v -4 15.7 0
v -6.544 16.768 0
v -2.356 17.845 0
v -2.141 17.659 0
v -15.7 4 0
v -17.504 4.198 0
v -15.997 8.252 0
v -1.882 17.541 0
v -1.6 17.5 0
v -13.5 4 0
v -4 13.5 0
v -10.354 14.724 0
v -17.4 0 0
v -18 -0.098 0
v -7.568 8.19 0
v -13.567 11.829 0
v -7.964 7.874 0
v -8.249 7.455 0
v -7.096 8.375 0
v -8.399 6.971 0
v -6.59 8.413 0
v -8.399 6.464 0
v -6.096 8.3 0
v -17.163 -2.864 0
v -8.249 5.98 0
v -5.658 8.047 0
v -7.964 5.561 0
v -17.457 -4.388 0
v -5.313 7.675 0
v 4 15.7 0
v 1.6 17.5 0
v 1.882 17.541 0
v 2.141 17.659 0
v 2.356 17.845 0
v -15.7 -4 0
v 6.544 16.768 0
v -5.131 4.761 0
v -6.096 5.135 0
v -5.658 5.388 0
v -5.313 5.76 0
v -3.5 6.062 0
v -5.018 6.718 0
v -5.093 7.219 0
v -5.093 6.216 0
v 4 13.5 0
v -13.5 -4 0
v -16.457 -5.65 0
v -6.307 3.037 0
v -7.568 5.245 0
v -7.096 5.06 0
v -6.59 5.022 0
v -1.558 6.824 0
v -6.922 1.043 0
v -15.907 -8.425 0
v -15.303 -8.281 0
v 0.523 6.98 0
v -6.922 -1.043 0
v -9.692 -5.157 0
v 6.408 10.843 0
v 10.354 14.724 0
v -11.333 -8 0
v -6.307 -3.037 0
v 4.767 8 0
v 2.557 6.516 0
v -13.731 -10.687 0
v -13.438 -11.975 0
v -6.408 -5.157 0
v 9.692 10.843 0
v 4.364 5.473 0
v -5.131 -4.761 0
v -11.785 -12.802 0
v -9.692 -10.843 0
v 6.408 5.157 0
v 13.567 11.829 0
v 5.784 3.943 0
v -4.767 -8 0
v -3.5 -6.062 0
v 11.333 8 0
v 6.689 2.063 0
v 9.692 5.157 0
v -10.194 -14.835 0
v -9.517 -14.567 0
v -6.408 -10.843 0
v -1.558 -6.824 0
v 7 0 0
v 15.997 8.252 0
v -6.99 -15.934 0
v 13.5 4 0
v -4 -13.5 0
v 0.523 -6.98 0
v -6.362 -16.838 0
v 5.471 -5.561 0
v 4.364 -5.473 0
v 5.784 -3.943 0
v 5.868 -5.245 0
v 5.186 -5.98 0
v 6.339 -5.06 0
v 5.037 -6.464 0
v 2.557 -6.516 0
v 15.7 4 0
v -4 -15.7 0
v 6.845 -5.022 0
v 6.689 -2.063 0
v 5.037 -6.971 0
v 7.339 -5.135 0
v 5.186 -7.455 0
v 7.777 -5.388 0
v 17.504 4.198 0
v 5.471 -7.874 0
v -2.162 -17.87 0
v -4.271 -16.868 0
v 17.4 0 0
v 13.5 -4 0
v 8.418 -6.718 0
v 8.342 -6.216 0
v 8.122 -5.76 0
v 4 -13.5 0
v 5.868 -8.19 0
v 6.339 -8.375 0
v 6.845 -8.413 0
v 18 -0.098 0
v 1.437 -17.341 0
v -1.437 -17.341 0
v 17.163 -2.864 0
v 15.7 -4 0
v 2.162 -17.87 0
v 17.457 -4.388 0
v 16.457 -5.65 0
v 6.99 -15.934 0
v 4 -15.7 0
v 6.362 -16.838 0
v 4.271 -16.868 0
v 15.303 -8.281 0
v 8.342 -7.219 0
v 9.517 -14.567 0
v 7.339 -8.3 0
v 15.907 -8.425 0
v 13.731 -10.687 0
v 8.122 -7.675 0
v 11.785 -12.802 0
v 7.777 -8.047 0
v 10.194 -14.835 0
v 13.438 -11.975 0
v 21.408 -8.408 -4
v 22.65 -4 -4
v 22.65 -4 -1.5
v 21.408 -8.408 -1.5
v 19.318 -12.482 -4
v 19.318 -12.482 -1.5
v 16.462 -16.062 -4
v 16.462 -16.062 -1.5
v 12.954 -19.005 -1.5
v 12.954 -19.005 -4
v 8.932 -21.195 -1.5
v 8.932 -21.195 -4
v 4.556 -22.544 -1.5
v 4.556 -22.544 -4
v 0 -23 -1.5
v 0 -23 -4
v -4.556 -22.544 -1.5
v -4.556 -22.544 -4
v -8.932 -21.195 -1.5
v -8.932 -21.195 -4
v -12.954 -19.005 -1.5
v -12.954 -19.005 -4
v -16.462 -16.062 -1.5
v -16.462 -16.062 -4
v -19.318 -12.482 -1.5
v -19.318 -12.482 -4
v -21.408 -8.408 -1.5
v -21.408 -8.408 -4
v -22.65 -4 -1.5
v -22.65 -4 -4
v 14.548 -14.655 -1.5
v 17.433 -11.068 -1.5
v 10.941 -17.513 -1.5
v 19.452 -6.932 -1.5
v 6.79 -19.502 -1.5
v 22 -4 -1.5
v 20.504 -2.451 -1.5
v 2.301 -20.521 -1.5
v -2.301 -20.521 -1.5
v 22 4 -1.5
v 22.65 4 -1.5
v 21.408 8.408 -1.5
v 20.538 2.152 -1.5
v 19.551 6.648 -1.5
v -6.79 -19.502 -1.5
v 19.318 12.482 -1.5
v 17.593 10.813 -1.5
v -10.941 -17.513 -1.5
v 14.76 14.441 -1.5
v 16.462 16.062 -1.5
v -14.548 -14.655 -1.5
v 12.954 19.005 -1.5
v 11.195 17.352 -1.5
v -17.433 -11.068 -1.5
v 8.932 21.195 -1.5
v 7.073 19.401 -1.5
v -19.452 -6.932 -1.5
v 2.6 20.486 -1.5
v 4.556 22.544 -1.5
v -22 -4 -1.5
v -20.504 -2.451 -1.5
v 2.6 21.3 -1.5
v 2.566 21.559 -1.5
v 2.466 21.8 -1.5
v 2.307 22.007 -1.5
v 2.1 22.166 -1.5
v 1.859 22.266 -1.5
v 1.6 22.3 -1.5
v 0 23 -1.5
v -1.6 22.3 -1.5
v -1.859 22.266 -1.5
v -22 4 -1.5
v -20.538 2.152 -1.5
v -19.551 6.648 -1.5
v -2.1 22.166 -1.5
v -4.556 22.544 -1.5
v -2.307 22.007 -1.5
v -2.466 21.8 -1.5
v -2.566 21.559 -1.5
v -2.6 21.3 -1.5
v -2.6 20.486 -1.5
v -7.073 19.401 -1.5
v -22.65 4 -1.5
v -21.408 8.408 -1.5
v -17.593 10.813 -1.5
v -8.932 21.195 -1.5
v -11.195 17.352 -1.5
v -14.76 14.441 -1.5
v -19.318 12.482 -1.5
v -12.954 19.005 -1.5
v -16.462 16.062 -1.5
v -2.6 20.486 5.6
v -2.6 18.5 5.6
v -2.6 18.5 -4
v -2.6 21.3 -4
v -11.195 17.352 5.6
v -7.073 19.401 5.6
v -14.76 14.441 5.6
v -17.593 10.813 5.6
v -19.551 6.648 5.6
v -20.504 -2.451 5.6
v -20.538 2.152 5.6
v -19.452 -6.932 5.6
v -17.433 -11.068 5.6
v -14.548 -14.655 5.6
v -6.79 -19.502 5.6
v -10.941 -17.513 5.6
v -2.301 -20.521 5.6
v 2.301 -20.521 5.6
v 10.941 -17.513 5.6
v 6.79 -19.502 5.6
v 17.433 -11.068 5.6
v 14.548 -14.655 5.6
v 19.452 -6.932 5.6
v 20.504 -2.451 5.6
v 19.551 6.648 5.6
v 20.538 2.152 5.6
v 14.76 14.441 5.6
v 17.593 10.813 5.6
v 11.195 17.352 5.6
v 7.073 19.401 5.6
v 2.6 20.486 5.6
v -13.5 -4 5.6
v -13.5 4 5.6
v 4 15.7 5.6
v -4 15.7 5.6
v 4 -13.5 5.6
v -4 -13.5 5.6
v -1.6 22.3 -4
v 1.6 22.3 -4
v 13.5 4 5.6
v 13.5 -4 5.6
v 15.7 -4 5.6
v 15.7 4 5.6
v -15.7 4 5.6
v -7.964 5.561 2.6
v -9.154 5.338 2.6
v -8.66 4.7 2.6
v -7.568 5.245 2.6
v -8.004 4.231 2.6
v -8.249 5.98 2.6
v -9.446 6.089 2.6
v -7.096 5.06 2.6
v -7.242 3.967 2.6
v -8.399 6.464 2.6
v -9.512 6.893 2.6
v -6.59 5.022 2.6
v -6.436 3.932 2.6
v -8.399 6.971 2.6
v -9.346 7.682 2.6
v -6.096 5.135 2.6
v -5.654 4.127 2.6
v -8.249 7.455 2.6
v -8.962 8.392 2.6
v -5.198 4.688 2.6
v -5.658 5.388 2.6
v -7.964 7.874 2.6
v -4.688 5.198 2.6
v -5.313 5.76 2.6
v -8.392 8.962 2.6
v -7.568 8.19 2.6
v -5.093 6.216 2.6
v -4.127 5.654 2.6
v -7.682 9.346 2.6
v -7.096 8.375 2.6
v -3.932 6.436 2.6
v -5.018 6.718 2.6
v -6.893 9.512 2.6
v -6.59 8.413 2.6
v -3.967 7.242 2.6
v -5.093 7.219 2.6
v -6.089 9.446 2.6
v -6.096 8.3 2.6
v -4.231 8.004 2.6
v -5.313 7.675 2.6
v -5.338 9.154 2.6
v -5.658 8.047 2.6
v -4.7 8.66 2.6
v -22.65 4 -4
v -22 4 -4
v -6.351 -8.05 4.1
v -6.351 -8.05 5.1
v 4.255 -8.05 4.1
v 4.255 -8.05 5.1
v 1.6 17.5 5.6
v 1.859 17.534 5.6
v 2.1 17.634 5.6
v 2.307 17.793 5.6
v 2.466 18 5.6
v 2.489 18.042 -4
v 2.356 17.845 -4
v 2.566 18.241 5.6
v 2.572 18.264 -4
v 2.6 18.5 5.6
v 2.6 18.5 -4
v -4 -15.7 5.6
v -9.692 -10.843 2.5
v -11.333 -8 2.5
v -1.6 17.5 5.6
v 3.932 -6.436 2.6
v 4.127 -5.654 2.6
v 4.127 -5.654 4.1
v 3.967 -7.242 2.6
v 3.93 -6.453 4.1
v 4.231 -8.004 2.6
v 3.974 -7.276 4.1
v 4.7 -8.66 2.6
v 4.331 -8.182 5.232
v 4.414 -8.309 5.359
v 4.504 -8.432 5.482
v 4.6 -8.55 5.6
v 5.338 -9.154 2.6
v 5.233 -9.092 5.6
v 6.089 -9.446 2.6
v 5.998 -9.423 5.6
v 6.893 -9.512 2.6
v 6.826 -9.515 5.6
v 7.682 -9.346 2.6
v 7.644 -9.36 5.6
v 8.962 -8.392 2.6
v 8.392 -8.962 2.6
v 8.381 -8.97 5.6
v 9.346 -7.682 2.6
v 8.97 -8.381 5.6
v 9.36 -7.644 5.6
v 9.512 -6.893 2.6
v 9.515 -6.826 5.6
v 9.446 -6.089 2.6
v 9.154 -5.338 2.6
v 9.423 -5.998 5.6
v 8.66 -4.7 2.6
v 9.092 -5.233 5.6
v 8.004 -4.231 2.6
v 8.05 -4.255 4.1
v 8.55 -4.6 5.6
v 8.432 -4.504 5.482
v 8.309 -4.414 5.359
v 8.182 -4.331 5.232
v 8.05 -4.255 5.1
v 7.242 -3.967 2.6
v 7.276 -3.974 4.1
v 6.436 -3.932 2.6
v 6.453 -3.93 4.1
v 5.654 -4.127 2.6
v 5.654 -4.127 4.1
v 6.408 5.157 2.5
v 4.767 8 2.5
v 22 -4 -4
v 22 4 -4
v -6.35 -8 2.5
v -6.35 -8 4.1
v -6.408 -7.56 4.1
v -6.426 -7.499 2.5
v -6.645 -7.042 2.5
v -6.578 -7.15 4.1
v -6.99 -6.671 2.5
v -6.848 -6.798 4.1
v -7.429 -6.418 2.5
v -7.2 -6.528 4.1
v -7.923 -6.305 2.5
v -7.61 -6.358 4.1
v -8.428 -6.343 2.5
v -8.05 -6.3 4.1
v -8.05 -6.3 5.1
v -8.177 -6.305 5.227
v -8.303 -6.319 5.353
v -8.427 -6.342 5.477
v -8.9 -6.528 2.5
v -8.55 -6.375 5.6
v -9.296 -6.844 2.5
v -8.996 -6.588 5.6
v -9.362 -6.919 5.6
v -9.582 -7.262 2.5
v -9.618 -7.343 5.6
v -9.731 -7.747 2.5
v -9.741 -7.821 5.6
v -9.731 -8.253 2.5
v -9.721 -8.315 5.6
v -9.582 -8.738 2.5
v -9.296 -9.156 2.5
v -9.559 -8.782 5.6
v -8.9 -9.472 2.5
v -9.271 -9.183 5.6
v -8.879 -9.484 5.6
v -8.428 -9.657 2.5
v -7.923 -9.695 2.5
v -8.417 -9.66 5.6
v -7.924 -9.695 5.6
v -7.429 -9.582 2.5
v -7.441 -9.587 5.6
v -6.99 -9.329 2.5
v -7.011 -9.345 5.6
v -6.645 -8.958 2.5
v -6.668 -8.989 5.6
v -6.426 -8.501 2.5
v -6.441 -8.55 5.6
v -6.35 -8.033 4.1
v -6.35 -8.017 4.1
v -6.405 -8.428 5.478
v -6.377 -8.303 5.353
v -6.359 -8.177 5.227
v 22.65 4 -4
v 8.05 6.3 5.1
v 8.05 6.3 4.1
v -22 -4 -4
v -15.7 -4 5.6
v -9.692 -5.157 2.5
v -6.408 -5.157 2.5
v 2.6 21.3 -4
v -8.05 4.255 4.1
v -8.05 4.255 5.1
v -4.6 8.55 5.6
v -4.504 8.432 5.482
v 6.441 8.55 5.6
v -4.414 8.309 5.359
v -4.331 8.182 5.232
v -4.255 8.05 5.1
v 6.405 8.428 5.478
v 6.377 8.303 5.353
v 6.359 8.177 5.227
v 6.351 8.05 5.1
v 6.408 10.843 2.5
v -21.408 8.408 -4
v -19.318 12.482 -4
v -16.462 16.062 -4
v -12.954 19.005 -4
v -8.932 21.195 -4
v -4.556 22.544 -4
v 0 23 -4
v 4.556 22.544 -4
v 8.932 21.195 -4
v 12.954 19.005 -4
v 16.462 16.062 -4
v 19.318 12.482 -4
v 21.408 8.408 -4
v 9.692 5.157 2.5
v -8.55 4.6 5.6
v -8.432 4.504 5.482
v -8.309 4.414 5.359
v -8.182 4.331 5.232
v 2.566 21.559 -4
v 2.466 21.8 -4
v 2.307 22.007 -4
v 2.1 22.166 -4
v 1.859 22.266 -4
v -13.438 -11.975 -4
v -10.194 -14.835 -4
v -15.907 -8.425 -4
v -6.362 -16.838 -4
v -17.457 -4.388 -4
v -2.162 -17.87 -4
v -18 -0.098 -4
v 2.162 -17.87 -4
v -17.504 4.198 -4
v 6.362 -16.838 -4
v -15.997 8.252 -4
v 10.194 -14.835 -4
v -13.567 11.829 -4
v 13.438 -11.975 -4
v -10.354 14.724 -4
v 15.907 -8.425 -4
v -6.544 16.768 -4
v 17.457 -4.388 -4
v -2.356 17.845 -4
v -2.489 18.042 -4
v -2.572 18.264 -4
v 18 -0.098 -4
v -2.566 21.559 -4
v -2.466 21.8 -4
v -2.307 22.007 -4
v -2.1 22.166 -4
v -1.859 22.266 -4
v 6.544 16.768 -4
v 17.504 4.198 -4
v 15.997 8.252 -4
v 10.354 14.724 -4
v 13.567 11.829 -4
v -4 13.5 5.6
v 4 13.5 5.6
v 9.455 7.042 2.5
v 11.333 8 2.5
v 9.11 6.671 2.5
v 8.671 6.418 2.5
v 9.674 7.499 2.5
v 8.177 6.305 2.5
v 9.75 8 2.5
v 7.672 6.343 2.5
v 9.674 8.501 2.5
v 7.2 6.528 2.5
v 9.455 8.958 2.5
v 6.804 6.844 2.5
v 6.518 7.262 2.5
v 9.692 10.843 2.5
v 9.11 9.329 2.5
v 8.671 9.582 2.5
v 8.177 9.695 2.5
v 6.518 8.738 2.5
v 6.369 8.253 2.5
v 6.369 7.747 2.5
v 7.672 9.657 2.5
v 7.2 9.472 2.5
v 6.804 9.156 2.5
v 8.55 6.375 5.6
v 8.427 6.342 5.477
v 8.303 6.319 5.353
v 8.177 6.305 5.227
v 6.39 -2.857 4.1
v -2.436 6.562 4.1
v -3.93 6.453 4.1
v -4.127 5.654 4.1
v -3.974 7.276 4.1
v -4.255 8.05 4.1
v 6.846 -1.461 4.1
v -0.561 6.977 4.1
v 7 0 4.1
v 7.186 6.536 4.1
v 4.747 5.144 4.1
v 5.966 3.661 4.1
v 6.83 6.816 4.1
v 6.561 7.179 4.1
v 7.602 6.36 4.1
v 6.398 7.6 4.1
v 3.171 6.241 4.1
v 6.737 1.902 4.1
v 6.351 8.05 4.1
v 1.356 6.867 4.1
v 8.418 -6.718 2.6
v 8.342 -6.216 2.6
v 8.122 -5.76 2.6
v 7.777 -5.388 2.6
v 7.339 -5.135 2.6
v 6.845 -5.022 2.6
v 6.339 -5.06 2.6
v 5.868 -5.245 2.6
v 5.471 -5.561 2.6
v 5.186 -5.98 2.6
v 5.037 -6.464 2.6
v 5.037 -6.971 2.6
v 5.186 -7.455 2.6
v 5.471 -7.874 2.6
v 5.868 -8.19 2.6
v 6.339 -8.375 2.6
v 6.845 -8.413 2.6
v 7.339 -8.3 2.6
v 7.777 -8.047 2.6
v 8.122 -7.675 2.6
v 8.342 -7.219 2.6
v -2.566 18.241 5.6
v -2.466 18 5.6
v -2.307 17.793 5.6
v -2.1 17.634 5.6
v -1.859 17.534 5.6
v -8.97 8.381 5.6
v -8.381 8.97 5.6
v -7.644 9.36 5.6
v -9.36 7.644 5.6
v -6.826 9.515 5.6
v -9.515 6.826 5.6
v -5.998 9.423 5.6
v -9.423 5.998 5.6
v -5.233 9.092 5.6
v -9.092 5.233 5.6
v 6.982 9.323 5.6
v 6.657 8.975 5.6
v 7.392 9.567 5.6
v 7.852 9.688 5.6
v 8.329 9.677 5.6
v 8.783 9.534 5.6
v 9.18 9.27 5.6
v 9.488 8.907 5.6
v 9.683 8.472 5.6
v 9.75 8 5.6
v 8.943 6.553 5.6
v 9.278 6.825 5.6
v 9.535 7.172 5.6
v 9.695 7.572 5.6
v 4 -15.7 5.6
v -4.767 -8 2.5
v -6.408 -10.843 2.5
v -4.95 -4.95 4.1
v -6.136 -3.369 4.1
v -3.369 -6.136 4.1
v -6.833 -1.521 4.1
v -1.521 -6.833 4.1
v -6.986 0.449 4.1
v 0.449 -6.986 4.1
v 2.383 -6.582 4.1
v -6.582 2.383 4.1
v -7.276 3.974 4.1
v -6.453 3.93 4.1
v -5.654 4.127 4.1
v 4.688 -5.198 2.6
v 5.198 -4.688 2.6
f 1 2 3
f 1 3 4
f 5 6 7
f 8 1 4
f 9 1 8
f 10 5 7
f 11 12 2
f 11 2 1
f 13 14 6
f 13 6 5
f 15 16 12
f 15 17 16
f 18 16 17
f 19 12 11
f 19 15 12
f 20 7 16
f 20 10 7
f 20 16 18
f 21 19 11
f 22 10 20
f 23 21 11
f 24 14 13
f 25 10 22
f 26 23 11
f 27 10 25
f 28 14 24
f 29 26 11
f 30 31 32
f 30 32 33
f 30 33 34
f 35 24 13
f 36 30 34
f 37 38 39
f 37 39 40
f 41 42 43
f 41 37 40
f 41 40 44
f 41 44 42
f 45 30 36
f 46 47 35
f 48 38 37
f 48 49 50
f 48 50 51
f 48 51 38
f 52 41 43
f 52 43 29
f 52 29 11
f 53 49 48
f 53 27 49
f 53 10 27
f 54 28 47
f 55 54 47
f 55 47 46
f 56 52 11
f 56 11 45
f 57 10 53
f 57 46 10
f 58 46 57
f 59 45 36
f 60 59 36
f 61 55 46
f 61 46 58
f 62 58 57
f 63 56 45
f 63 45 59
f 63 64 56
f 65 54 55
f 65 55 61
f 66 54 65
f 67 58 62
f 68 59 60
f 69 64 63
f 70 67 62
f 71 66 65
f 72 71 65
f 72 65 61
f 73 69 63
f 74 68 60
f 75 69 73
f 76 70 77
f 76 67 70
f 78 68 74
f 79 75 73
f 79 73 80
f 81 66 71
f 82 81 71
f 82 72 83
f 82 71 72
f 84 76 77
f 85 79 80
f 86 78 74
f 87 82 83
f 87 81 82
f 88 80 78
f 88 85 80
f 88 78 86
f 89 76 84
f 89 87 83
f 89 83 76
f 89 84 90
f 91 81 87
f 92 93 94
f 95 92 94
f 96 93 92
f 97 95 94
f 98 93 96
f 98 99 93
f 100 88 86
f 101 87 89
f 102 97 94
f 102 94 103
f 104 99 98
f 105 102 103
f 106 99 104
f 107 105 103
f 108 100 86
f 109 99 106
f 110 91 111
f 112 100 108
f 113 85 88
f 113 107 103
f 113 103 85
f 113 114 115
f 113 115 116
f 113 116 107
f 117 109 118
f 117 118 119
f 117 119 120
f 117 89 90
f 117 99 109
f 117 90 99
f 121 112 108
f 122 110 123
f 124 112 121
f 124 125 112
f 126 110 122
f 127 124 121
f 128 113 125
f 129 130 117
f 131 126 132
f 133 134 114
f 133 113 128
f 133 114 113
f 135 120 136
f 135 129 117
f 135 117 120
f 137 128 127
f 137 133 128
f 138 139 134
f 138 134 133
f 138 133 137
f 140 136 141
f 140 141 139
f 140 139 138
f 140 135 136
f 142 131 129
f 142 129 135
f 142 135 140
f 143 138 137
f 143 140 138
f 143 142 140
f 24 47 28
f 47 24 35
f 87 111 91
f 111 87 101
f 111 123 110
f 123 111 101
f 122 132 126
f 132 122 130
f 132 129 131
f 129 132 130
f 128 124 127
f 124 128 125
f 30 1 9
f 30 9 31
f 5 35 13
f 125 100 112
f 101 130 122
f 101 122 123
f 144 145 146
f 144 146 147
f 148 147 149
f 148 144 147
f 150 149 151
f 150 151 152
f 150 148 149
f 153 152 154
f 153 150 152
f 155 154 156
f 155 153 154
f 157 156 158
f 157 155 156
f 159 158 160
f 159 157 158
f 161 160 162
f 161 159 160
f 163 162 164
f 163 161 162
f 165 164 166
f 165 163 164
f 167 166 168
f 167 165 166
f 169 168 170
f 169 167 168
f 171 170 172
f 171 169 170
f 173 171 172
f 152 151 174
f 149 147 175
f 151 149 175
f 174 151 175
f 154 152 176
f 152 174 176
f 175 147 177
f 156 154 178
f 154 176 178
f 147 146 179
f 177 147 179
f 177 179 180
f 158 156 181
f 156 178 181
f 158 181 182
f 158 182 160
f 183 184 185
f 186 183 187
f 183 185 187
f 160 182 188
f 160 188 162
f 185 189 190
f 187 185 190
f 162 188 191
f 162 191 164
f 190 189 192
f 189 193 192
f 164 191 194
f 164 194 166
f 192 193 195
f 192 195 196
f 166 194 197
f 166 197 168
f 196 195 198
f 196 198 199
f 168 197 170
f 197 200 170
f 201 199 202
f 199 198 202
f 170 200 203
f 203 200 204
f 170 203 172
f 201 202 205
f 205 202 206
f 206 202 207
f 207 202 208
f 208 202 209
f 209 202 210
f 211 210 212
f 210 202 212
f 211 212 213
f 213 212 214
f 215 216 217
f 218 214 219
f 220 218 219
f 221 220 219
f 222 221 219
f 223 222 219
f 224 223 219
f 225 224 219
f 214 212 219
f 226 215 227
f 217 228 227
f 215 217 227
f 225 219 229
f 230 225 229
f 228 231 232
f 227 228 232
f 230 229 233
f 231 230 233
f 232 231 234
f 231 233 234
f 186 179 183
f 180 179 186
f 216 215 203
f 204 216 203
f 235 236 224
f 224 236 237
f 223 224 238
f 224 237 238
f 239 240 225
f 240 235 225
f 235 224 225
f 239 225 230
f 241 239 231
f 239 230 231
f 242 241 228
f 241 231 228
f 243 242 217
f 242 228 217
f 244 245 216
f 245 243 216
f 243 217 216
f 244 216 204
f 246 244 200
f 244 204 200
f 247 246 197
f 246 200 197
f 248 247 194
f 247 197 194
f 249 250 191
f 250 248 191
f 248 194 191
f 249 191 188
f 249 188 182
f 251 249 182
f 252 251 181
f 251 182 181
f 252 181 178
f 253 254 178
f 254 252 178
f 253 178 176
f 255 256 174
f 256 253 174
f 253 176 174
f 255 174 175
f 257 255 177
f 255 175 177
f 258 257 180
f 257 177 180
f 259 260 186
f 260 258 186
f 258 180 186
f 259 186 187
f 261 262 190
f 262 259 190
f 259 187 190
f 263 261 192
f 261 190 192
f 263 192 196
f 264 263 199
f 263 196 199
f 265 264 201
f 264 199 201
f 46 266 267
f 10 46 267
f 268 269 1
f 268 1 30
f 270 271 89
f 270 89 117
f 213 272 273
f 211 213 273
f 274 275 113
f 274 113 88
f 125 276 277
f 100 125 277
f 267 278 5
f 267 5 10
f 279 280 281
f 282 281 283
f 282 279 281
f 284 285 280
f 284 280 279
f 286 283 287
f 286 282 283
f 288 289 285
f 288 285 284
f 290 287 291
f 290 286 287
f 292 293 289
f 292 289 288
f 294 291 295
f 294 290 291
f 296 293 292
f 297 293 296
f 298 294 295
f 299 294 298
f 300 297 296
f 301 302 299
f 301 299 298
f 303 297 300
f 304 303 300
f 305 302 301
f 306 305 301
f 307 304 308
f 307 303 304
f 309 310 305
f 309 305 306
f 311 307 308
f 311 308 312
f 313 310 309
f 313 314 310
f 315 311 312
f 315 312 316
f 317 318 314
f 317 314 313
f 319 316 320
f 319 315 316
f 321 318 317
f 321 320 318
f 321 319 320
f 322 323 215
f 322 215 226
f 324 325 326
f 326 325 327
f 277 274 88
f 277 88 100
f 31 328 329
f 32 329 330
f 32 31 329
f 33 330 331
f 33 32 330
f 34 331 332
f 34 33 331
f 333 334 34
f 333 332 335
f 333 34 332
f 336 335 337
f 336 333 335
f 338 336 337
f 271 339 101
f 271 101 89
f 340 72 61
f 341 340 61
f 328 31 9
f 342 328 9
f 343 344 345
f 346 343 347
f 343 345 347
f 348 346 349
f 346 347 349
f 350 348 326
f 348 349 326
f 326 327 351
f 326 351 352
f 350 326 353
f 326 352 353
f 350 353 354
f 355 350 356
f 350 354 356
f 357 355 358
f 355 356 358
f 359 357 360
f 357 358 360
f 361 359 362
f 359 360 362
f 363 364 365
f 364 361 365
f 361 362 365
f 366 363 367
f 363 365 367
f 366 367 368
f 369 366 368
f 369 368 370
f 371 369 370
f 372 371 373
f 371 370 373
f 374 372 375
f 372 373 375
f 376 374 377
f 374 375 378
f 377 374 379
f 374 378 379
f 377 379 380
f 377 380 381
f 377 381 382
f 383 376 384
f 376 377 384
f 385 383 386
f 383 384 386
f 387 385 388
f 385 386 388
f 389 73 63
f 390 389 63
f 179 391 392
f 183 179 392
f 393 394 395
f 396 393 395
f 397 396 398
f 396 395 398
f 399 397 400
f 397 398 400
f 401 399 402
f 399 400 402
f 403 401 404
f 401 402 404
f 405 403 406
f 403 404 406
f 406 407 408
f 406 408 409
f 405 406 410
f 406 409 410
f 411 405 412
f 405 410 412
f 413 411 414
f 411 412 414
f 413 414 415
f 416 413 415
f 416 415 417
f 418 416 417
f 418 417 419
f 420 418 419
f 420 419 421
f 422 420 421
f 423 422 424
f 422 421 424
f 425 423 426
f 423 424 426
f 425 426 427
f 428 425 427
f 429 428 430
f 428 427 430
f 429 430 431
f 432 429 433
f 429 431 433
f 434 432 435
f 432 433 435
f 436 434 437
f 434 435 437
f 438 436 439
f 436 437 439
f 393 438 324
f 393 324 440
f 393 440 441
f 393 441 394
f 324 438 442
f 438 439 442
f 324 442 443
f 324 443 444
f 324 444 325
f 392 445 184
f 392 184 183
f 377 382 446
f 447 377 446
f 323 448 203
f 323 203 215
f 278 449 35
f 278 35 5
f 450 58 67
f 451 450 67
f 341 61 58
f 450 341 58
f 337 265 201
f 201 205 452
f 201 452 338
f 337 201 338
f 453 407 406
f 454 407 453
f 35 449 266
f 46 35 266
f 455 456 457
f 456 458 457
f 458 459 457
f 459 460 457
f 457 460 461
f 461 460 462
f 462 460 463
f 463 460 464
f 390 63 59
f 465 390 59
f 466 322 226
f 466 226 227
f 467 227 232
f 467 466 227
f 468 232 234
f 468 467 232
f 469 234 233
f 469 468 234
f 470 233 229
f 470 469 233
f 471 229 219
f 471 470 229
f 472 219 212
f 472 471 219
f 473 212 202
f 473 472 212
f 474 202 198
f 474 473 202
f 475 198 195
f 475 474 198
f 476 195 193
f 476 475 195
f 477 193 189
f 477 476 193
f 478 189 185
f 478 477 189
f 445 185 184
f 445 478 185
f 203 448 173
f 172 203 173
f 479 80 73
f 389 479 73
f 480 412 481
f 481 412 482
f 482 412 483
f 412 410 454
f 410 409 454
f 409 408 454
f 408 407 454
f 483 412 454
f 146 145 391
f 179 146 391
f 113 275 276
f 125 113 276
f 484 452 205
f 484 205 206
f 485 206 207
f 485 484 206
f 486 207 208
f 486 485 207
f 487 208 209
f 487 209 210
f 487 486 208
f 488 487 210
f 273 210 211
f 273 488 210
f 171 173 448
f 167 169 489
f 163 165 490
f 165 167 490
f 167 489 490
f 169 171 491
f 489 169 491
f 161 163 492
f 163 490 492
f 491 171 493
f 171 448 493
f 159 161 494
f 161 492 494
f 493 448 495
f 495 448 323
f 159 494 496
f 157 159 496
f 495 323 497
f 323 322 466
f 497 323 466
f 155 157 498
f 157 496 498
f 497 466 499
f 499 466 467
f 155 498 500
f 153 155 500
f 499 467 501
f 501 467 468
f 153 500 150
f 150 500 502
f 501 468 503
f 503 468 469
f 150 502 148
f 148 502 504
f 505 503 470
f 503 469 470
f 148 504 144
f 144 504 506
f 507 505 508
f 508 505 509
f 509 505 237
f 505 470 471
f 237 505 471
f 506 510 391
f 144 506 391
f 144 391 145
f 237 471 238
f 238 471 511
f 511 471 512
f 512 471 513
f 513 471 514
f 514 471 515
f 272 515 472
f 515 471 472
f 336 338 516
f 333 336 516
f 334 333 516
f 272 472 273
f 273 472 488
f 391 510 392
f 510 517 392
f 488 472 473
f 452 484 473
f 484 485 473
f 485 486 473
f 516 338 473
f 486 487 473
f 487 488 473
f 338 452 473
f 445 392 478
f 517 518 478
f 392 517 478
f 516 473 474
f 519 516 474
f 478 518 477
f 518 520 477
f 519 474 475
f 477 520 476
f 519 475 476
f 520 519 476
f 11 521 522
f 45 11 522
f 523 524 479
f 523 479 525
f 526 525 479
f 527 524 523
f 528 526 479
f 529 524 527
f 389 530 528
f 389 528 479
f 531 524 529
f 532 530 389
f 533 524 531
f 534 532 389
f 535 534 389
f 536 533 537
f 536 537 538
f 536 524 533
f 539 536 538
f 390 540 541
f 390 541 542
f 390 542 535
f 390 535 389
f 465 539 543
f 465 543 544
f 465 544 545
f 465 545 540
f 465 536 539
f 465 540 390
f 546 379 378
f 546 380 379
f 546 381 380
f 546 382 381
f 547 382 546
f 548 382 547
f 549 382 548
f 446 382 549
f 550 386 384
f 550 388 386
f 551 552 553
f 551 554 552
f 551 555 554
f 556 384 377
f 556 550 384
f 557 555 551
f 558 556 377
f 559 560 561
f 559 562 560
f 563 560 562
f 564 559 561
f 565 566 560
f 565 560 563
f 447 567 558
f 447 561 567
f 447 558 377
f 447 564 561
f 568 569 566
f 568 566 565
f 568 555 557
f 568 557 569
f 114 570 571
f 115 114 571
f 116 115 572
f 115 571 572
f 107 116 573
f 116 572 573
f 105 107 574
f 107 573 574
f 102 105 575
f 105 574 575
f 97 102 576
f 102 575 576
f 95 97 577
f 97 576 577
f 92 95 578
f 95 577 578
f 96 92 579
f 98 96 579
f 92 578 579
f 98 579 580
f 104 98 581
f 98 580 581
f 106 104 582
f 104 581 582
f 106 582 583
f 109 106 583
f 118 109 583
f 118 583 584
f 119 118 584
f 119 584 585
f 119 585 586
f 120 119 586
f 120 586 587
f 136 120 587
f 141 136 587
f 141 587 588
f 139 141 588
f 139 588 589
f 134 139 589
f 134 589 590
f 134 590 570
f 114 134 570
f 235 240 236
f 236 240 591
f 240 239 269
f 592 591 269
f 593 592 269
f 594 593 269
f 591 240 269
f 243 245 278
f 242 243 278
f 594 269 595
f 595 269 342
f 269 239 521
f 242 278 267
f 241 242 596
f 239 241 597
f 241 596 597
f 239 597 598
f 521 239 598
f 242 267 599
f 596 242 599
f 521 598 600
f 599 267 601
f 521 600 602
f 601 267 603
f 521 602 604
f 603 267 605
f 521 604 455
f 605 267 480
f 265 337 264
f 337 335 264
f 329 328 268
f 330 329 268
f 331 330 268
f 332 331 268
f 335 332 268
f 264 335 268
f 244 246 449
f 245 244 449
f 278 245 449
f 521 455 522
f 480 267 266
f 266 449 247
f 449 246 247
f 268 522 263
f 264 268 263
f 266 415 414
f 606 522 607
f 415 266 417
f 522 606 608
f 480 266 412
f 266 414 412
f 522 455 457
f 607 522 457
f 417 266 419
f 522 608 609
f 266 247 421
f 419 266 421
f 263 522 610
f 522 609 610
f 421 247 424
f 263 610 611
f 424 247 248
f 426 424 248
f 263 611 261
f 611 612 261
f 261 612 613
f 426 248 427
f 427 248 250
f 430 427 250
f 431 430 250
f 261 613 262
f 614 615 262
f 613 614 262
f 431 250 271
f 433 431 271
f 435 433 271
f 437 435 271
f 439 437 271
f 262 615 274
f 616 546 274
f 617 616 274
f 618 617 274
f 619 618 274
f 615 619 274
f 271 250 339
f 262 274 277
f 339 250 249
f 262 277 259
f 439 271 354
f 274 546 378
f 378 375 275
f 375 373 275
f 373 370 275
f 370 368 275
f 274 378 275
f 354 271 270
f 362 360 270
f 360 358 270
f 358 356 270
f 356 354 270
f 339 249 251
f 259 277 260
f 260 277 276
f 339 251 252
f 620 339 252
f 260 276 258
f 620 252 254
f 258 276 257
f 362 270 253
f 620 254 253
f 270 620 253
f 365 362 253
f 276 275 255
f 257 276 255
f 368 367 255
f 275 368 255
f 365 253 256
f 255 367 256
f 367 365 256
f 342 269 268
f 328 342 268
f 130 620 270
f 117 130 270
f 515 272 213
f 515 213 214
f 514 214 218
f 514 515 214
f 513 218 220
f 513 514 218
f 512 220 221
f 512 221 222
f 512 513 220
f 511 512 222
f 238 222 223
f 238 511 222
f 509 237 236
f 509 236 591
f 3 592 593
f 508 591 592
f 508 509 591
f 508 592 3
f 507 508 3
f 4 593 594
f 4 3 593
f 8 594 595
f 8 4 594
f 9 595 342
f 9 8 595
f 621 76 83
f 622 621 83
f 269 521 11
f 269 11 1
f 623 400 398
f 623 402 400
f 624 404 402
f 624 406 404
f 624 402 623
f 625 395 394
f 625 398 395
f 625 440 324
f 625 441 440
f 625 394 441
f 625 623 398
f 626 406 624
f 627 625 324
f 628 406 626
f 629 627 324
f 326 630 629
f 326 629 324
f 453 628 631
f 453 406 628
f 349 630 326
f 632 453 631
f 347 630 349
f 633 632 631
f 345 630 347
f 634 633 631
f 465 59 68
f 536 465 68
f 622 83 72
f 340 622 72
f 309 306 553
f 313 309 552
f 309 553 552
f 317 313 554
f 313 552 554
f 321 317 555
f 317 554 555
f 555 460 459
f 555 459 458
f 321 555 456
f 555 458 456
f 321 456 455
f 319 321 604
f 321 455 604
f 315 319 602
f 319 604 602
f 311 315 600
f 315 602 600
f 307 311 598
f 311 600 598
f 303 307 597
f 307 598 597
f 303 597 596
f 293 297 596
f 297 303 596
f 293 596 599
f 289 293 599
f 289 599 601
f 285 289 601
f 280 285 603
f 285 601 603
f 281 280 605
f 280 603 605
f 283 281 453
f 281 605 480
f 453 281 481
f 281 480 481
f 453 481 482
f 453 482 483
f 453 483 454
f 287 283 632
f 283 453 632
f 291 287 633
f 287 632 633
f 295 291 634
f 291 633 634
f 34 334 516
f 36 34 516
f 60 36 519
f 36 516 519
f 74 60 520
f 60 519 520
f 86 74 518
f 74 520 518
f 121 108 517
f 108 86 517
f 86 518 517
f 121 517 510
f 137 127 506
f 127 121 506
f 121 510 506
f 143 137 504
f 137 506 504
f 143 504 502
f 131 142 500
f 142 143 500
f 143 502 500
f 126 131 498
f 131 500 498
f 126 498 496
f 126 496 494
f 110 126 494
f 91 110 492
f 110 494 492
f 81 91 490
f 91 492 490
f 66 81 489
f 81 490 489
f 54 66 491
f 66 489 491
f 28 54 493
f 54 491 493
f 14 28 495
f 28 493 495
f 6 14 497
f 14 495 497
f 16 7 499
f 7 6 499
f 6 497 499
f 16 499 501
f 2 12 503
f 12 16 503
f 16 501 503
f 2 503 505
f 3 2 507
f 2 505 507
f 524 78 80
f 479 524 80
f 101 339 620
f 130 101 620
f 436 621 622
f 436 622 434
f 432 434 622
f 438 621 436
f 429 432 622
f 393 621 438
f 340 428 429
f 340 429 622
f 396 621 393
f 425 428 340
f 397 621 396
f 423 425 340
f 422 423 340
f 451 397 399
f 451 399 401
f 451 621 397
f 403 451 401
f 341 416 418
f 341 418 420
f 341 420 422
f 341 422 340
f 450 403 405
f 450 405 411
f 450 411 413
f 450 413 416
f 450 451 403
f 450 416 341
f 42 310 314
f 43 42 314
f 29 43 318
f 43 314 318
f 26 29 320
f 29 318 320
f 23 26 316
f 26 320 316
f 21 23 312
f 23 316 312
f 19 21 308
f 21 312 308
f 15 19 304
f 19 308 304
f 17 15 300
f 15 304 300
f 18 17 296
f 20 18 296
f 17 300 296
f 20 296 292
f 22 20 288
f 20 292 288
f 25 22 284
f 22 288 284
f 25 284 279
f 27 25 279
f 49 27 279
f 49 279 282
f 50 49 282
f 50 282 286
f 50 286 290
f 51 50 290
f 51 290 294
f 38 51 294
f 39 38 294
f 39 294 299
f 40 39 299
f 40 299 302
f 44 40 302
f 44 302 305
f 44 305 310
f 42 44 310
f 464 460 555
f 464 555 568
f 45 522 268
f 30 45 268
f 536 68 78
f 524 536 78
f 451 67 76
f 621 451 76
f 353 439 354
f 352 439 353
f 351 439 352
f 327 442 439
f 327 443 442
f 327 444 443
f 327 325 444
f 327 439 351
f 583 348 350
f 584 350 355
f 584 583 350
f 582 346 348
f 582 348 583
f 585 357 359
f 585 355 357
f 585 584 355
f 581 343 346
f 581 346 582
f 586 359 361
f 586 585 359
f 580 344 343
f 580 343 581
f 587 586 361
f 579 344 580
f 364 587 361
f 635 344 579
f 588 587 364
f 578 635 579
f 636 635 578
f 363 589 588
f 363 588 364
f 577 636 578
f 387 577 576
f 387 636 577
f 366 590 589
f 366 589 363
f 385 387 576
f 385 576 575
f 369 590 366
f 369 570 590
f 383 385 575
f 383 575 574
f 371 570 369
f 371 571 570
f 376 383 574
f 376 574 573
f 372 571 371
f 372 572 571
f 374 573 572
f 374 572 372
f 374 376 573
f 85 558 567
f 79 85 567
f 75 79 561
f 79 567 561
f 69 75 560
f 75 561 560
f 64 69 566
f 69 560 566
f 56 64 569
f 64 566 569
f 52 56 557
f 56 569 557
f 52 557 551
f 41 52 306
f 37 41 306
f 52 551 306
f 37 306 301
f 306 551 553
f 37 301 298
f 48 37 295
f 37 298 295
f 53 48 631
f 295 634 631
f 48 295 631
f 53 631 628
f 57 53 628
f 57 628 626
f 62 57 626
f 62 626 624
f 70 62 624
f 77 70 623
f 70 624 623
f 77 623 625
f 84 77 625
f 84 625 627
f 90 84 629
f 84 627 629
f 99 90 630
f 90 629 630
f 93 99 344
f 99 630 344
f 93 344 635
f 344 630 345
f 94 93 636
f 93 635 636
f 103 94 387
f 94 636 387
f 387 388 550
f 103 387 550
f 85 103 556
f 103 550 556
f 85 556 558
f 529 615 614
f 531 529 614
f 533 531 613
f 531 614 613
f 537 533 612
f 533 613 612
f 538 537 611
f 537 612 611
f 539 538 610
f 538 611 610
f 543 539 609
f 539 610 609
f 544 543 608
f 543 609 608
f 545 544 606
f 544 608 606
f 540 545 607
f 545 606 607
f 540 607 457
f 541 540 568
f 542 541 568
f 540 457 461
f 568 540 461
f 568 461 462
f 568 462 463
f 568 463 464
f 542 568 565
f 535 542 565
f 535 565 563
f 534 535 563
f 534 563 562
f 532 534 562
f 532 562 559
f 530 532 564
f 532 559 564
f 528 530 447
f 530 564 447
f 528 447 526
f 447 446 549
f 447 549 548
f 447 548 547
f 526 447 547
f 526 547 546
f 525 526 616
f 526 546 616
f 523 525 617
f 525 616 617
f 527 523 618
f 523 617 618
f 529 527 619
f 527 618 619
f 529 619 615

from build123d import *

# Parameters (mm, degrees)
SKETCH_1_R               = 17.4
EXTRUDE_1_DEPTH          = 5.6
SKETCH_2_R               = 1.7
CUT_EXTRUDE_1_DEPTH      = 26.23648153
SKETCH_3_R               = 7
CUT_EXTRUDE_2_DEPTH      = 26.23648153
SKETCH_4_R               = 2.8
CUT_EXTRUDE_3_DEPTH      = 3
SKETCH_5_R               = 1.7
CUT_EXTRUDE_4_DEPTH      = 26.23648153
CUT_EXTRUDE_5_DEPTH      = 2.5
SKETCH_7_W               = 16.1
SKETCH_7_H               = 16.1
CUT_EXTRUDE_6_DEPTH      = 1.5
CHAMFER_1_SIZE           = 0.5
SKETCH_9_W               = 2.2
SKETCH_9_H               = 8
SKETCH_9_W_2             = 8
SKETCH_9_H_2             = 2.2
CUT_EXTRUDE_7_DEPTH      = 26.281613873
BOSS_EXTRUDE1_DEPTH      = 5.6
BOSS_EXTRUDE1_DEPTH_BACK = 4
SKETCH1_R                = 20.65
SKETCH1_R_2              = 17.4
SKETCH3_R                = 23
SKETCH3_R_2              = 20.65
BOSS_EXTRUDE2_DEPTH      = 2.5
SKETCH4_R                = 18
CUT_EXTRUDE3_DEPTH       = 4
SKETCH5_W                = 1
SKETCH5_H                = 8
CUT_EXTRUDE4_DEPTH       = 10
CUT_EXTRUDE6_DEPTH       = 10
FILLET3_R                = 1


with BuildPart() as part:
    # 草图1 → 凸台-拉伸1 (new body)
    with BuildSketch(Plane.XY):
        Circle(SKETCH_1_R)
    extrude(amount=EXTRUDE_1_DEPTH)

    # 草图2 → 切除-拉伸1 (cut, through all)
    with BuildSketch(Plane.XY.offset(5.6)):
        with Locations((-6.717514421, 6.717514421)):
            Circle(SKETCH_2_R)
        with Locations((6.717514421, -6.717514421)):
            Circle(SKETCH_2_R)
    extrude(amount=-CUT_EXTRUDE_1_DEPTH, mode=Mode.SUBTRACT)

    # 草图3 → 切除-拉伸2 (cut, through all)
    with BuildSketch(Plane.XY.offset(5.6)):
        Circle(SKETCH_3_R)
    extrude(amount=-CUT_EXTRUDE_2_DEPTH, mode=Mode.SUBTRACT)

    # 草图4 → 切除-拉伸3 (cut)
    with BuildSketch(Plane.XY.offset(5.6)):
        with Locations((-6.717514421, 6.717514421)):
            Circle(SKETCH_4_R)
        with Locations((6.717514421, -6.717514421)):
            Circle(SKETCH_4_R)
    extrude(amount=-CUT_EXTRUDE_3_DEPTH, mode=Mode.SUBTRACT)

    # 草图5 → 切除-拉伸4 (cut, through all)
    with BuildSketch(Plane.XY.offset(5.6)):
        with Locations((8.05, 8)):
            Circle(SKETCH_5_R)
        with Locations((-8.05, -8)):
            Circle(SKETCH_5_R)
    extrude(amount=-CUT_EXTRUDE_4_DEPTH, mode=Mode.SUBTRACT)

    # 草图6 → 切除-拉伸5 (cut)
    with BuildSketch(Plane(origin=(0, 0, 0), x_dir=(-1, 0, 0), z_dir=(0, 0, -1))):
        Polygon((4.766838493, -8), (6.408419246, -10.84330127), (9.691580754, -10.84330127), (11.333161507, -8), (9.691580754, -5.15669873), (6.408419246, -5.15669873), align=None)
        Polygon((-4.766838493, 8), (-6.408419246, 10.84330127), (-9.691580754, 10.84330127), (-11.333161507, 8), (-9.691580754, 5.15669873), (-6.408419246, 5.15669873), align=None)
    extrude(amount=-CUT_EXTRUDE_5_DEPTH, mode=Mode.SUBTRACT)

    # 草图7 → 切除-拉伸6 (cut)
    with BuildSketch(Plane.XY.offset(5.6)):
        Rectangle(SKETCH_7_W, SKETCH_7_H)
    extrude(amount=-CUT_EXTRUDE_6_DEPTH, mode=Mode.SUBTRACT)

    # 倒角1
    chamfer_1_edges = [part.edges().sort_by_distance(p)[0] for p in [
        (8.05, 1.022551258, 5.6),
        (1.047918985, 8.05, 5.6),
        (-8.05, -1.022551258, 5.6),
        (-1.047918985, -8.05, 5.6),
    ]]
    chamfer(chamfer_1_edges, length=CHAMFER_1_SIZE)

    # 草图8 → 旋转1 (revolve)
    with BuildSketch(Plane(origin=(0, 0, 0), x_dir=(0, 0, -1), z_dir=(1, 0, 0)), mode=Mode.PRIVATE) as revolve_1_sk:
        Polygon((0, 17.4), (0, 17.2), (0.2, 17.4), align=None)
    revolve(revolve_1_sk.sketch.rotate(Axis((0, 0, 0), (0, 0, 1)), 90), axis=Axis((0, 0, 0), (0, 0, 1)))

    # 草图9 → 切除-拉伸7 (cut, through all)
    with BuildSketch(Plane.XY.offset(5.6)):
        with Locations((14.6, 0)):
            Rectangle(SKETCH_9_W, SKETCH_9_H)
        with Locations((0, 14.6)):
            Rectangle(SKETCH_9_W_2, SKETCH_9_H_2)
        with Locations((-14.6, 0)):
            Rectangle(SKETCH_9_W, SKETCH_9_H)
        with Locations((0, -14.6)):
            Rectangle(SKETCH_9_W_2, SKETCH_9_H_2)
    extrude(amount=-CUT_EXTRUDE_7_DEPTH, mode=Mode.SUBTRACT)

    # Sketch1 → Boss-Extrude1 (add, two sides: drawn at the far end of the back side and taken through both)
    with BuildSketch(Plane.XY.offset(-BOSS_EXTRUDE1_DEPTH_BACK)):
        Circle(SKETCH1_R)
        Circle(SKETCH1_R_2, mode=Mode.SUBTRACT)
    extrude(amount=BOSS_EXTRUDE1_DEPTH + BOSS_EXTRUDE1_DEPTH_BACK)

    # Sketch3 → Boss-Extrude2 (add)
    with BuildSketch(Plane(origin=(0, 0, -4), x_dir=(-1, 0, 0), z_dir=(0, 0, -1))):
        Circle(SKETCH3_R)
        with Locations(Location((0, 0, 0), (0, 0, 180))):
            Circle(SKETCH3_R_2, mode=Mode.SUBTRACT)
    extrude(amount=-BOSS_EXTRUDE2_DEPTH)

    # Sketch4 → Cut-Extrude3 (cut)
    with BuildSketch(Plane(origin=(0, 0, -4), x_dir=(-1, 0, 0), z_dir=(0, 0, -1))):
        Circle(SKETCH4_R)
    extrude(amount=-CUT_EXTRUDE3_DEPTH, mode=Mode.SUBTRACT)

    # Sketch5 → Cut-Extrude4 (cut)
    with BuildSketch(Plane(origin=(0, 0, -4), x_dir=(-1, 0, 0), z_dir=(0, 0, -1))):
        with Locations((22.5, 0)):
            Rectangle(SKETCH5_W, SKETCH5_H)
        with Locations((-22.5, 0)):
            Rectangle(SKETCH5_W, SKETCH5_H)
    extrude(amount=-CUT_EXTRUDE4_DEPTH, mode=Mode.SUBTRACT)

    # Sketch7 → Cut-Extrude6 (cut)
    with BuildSketch(Plane(origin=(0, 0, -4), x_dir=(-1, 0, 0), z_dir=(0, 0, -1))):
        with BuildLine():
            Line((0, 18), (0, 22.3))
            Line((0, 22.3), (-2.6, 22.3))
            Line((-2.6, 22.3), (-2.6, 17.811232411))
            ThreePointArc((-2.6, 17.811232411), (-1.303421766, 17.952746077), (0, 18))
        make_face()
        with BuildLine():
            Line((0, 17.5), (0, 18))
            ThreePointArc((0, 18), (-1.303421766, 17.952746077), (-2.6, 17.811232411))
            Line((-2.6, 17.811232411), (-2.6, 17.5))
            Line((-2.6, 17.5), (0, 17.5))
        make_face()
        with BuildLine():
            Line((2.6, 22.3), (0, 22.3))
            Line((0, 22.3), (0, 18))
            ThreePointArc((0, 18), (1.303421766, 17.952746077), (2.6, 17.811232411))
            Line((2.6, 17.811232411), (2.6, 22.3))
        make_face()
        with BuildLine():
            ThreePointArc((2.6, 17.811232411), (1.303421766, 17.952746077), (0, 18))
            Line((0, 18), (0, 17.5))
            Line((0, 17.5), (2.6, 17.5))
            Line((2.6, 17.5), (2.6, 17.811232411))
        make_face()
    extrude(amount=-CUT_EXTRUDE6_DEPTH, mode=Mode.SUBTRACT)

    # Fillet3
    # the kernel refuses this fillet: 1 mm, written as the material it adds along each edge
    with BuildSketch(Plane(origin=(2.6, 22.3, -4), x_dir=(-1, 0, 0), z_dir=(0, 0, 1))) as fillet3_piece_1:
        with BuildLine():
            CenterArc((FILLET3_R, FILLET3_R), FILLET3_R, 180, 90)
            Line((0, FILLET3_R), (-FILLET3_R * 0.02, FILLET3_R))
            Line((-FILLET3_R * 0.02, FILLET3_R), (-FILLET3_R * 0.02, -FILLET3_R * 0.02))
            Line((-FILLET3_R * 0.02, -FILLET3_R * 0.02), (FILLET3_R, -FILLET3_R * 0.02))
            Line((FILLET3_R, -FILLET3_R * 0.02), (FILLET3_R, 0))
        make_face()
    extrude(amount=2.5)
    with BuildSketch(Plane(origin=(-2.6, 22.3, -4), x_dir=(1, 0, 0), z_dir=(0, 0, 1))) as fillet3_piece_2:
        with BuildLine():
            CenterArc((FILLET3_R, -FILLET3_R), FILLET3_R, 90, 90)
            Line((0, -FILLET3_R), (-FILLET3_R * 0.02, -FILLET3_R))
            Line((-FILLET3_R * 0.02, -FILLET3_R), (-FILLET3_R * 0.02, FILLET3_R * 0.02))
            Line((-FILLET3_R * 0.02, FILLET3_R * 0.02), (FILLET3_R, FILLET3_R * 0.02))
            Line((FILLET3_R, FILLET3_R * 0.02), (FILLET3_R, 0))
        make_face()
    extrude(amount=2.5)
    with BuildSketch(Plane(origin=(-2.6, 17.5, -6), x_dir=(0, 1, 0), z_dir=(0, 0, 1))) as fillet3_piece_3_section:
        with BuildLine():
            CenterArc((FILLET3_R, -FILLET3_R), FILLET3_R, 90, 90)
            Line((0, -FILLET3_R), (-FILLET3_R * 0.02, -FILLET3_R))
            Line((-FILLET3_R * 0.02, -FILLET3_R), (-FILLET3_R * 0.02, FILLET3_R * 0.02))
            Line((-FILLET3_R * 0.02, FILLET3_R * 0.02), (FILLET3_R, FILLET3_R * 0.02))
            Line((FILLET3_R, FILLET3_R * 0.02), (FILLET3_R, 0))
        make_face()
    fillet3_piece_3 = extrude(amount=11.6, mode=Mode.PRIVATE)
    fillet3_piece_3 = split(fillet3_piece_3, bisect_by=Plane(origin=(-2.544482942, 18.024809788, 0), z_dir=(0, 0, -1)), keep=Keep.TOP, mode=Mode.PRIVATE)
    fillet3_piece_3 = fillet3_piece_3 - Plane(origin=(0, 0, -2), x_dir=(-1, 0, 0), z_dir=(0, 0, -1)) * Cylinder(18, 28, mode=Mode.PRIVATE)
    fillet3_piece_3 = split(fillet3_piece_3, bisect_by=Plane(origin=(-2.544482942, 18.024809788, -4), z_dir=(0, 0, 1)), keep=Keep.TOP, mode=Mode.PRIVATE)
    add(fillet3_piece_3)
    with BuildSketch(Plane(origin=(-2.6, 17.5, 0), x_dir=(0, 1, 0), z_dir=(0, 0, 1))) as fillet3_piece_4_section:
        with BuildLine():
            CenterArc((FILLET3_R, -FILLET3_R), FILLET3_R, 90, 90)
            Line((0, -FILLET3_R), (-FILLET3_R * 0.02, -FILLET3_R))
            Line((-FILLET3_R * 0.02, -FILLET3_R), (-FILLET3_R * 0.02, FILLET3_R * 0.02))
            Line((-FILLET3_R * 0.02, FILLET3_R * 0.02), (FILLET3_R, FILLET3_R * 0.02))
            Line((FILLET3_R, FILLET3_R * 0.02), (FILLET3_R, 0))
        make_face()
    fillet3_piece_4 = extrude(amount=5.6, mode=Mode.PRIVATE)
    fillet3_piece_4 = fillet3_piece_4 - Plane(origin=(0, 0, 2.8), x_dir=(-1, 0, 0), z_dir=(0, 0, -1)) * Cylinder(18, 16, mode=Mode.PRIVATE)
    add(fillet3_piece_4)
    with BuildSketch(Plane(origin=(-2.6, 17.5, 0), x_dir=(0, 1, 0), z_dir=(0, 0, 1))) as fillet3_piece_5_section:
        with BuildLine():
            CenterArc((FILLET3_R, -FILLET3_R), FILLET3_R, 90, 90)
            Line((0, -FILLET3_R), (-FILLET3_R * 0.02, -FILLET3_R))
            Line((-FILLET3_R * 0.02, -FILLET3_R), (-FILLET3_R * 0.02, FILLET3_R * 0.02))
            Line((-FILLET3_R * 0.02, FILLET3_R * 0.02), (FILLET3_R, FILLET3_R * 0.02))
            Line((FILLET3_R, FILLET3_R * 0.02), (FILLET3_R, 0))
        make_face()
    fillet3_piece_5 = extrude(amount=5.6, mode=Mode.PRIVATE)
    fillet3_piece_5 = fillet3_piece_5 & Plane(origin=(0, 0, 2.8), x_dir=(-1, 0, 0), z_dir=(0, 0, -1)) * Cylinder(18, 16, mode=Mode.PRIVATE)
    add(fillet3_piece_5)
    with BuildSketch(Plane(origin=(2.6, 17.5, -6), x_dir=(-1, 0, 0), z_dir=(0, 0, 1))) as fillet3_piece_6_section:
        with BuildLine():
            CenterArc((FILLET3_R, -FILLET3_R), FILLET3_R, 90, 90)
            Line((0, -FILLET3_R), (-FILLET3_R * 0.02, -FILLET3_R))
            Line((-FILLET3_R * 0.02, -FILLET3_R), (-FILLET3_R * 0.02, FILLET3_R * 0.02))
            Line((-FILLET3_R * 0.02, FILLET3_R * 0.02), (FILLET3_R, FILLET3_R * 0.02))
            Line((FILLET3_R, FILLET3_R * 0.02), (FILLET3_R, 0))
        make_face()
    fillet3_piece_6 = extrude(amount=11.6, mode=Mode.PRIVATE)
    fillet3_piece_6 = split(fillet3_piece_6, bisect_by=Plane(origin=(2.544482942, 18.024809788, 0), z_dir=(0, 0, -1)), keep=Keep.TOP, mode=Mode.PRIVATE)
    fillet3_piece_6 = fillet3_piece_6 - Plane(origin=(0, 0, -2), x_dir=(-1, 0, 0), z_dir=(0, 0, -1)) * Cylinder(18, 28, mode=Mode.PRIVATE)
    fillet3_piece_6 = split(fillet3_piece_6, bisect_by=Plane(origin=(2.544482942, 18.024809788, -4), z_dir=(0, 0, 1)), keep=Keep.TOP, mode=Mode.PRIVATE)
    add(fillet3_piece_6)
    with BuildSketch(Plane(origin=(2.6, 17.5, 0), x_dir=(-1, 0, 0), z_dir=(0, 0, 1))) as fillet3_piece_7_section:
        with BuildLine():
            CenterArc((FILLET3_R, -FILLET3_R), FILLET3_R, 90, 90)
            Line((0, -FILLET3_R), (-FILLET3_R * 0.02, -FILLET3_R))
            Line((-FILLET3_R * 0.02, -FILLET3_R), (-FILLET3_R * 0.02, FILLET3_R * 0.02))
            Line((-FILLET3_R * 0.02, FILLET3_R * 0.02), (FILLET3_R, FILLET3_R * 0.02))
            Line((FILLET3_R, FILLET3_R * 0.02), (FILLET3_R, 0))
        make_face()
    fillet3_piece_7 = extrude(amount=5.6, mode=Mode.PRIVATE)
    fillet3_piece_7 = fillet3_piece_7 & Plane(origin=(0, 0, 2.8), x_dir=(-1, 0, 0), z_dir=(0, 0, -1)) * Cylinder(18, 16, mode=Mode.PRIVATE)
    add(fillet3_piece_7)
    with BuildSketch(Plane(origin=(2.6, 17.5, 0), x_dir=(-1, 0, 0), z_dir=(0, 0, 1))) as fillet3_piece_8_section:
        with BuildLine():
            CenterArc((FILLET3_R, -FILLET3_R), FILLET3_R, 90, 90)
            Line((0, -FILLET3_R), (-FILLET3_R * 0.02, -FILLET3_R))
            Line((-FILLET3_R * 0.02, -FILLET3_R), (-FILLET3_R * 0.02, FILLET3_R * 0.02))
            Line((-FILLET3_R * 0.02, FILLET3_R * 0.02), (FILLET3_R, FILLET3_R * 0.02))
            Line((FILLET3_R, FILLET3_R * 0.02), (FILLET3_R, 0))
        make_face()
    fillet3_piece_8 = extrude(amount=5.6, mode=Mode.PRIVATE)
    fillet3_piece_8 = fillet3_piece_8 - Plane(origin=(0, 0, 2.8), x_dir=(-1, 0, 0), z_dir=(0, 0, -1)) * Cylinder(18, 16, mode=Mode.PRIVATE)
    add(fillet3_piece_8)


solid = part.part
